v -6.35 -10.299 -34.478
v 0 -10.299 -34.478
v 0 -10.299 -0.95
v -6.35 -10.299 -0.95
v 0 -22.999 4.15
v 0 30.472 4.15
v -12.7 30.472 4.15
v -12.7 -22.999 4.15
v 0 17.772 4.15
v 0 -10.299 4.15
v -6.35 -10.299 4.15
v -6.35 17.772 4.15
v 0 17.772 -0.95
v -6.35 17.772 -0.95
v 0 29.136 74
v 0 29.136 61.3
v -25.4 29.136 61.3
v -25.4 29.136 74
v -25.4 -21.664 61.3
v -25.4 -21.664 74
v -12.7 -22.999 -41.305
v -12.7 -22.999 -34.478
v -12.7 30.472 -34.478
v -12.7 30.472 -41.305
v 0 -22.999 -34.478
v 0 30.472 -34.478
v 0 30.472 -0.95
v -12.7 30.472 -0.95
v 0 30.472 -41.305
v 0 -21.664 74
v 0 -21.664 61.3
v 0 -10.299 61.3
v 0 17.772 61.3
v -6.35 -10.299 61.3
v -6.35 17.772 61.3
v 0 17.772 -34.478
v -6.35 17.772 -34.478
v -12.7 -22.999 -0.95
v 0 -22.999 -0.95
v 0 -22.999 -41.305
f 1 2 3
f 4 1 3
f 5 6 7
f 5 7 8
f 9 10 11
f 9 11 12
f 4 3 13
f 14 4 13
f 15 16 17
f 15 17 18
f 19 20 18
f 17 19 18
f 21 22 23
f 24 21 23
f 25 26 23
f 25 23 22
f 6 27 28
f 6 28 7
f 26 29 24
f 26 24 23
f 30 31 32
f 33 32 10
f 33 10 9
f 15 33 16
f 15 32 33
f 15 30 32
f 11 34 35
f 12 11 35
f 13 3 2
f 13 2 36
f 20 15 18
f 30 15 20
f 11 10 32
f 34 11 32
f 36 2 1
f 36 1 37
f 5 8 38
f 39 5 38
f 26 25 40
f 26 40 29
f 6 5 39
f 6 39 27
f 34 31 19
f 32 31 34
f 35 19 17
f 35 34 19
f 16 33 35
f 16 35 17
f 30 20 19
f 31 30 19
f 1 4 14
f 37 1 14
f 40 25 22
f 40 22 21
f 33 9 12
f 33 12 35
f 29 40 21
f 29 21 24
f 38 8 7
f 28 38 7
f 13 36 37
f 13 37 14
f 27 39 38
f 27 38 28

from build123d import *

# Parameters (mm, degrees)
F1_DEPTH = 25.4
F0_W     = 28.07054
F0_H     = 57.15
F0_H_2   = 33.528
F2_DEPTH = 6.35
F3_DEPTH = 12.7


with BuildPart() as f1:
    # F0 (on Right) → F1 (new body)
    with BuildSketch(Plane.YZ):
        Polygon((29.136367, 73.999954), (-21.663633, 73.999954), (-21.663633, 61.299954), (-10.298899, 61.299954), (17.771641, 61.299954), (29.136376, 61.299954), align=None)
    extrude(amount=-F1_DEPTH)

    # F0 (on Right) → F2 (join)
    with BuildSketch(Plane.YZ):
        with Locations((3.736371, 32.724954)):
            Rectangle(F0_W, F0_H)
        with Locations((3.736371, -17.713681)):
            Rectangle(F0_W, F0_H_2)
    extrude(amount=-F2_DEPTH)


with BuildPart() as f3:
    # F0 (on Right) → F3 (new body)
    with BuildSketch(Plane.YZ):
        Polygon((17.771641, 4.149954), (-10.298899, 4.149954), (-22.998899, 4.149954), (-22.998899, -0.949681), (-10.298899, -0.949681), (17.771641, -0.949681), (30.471641, -0.949681), (30.471641, 4.149954), align=None)
        Polygon((17.771641, -34.477681), (-10.298899, -34.477681), (-22.998899, -34.477681), (-22.998899, -41.305353), (30.471641, -41.305353), (30.471641, -34.477681), align=None)
    extrude(amount=-F3_DEPTH)


solid = Compound([f1.part, f3.part])
